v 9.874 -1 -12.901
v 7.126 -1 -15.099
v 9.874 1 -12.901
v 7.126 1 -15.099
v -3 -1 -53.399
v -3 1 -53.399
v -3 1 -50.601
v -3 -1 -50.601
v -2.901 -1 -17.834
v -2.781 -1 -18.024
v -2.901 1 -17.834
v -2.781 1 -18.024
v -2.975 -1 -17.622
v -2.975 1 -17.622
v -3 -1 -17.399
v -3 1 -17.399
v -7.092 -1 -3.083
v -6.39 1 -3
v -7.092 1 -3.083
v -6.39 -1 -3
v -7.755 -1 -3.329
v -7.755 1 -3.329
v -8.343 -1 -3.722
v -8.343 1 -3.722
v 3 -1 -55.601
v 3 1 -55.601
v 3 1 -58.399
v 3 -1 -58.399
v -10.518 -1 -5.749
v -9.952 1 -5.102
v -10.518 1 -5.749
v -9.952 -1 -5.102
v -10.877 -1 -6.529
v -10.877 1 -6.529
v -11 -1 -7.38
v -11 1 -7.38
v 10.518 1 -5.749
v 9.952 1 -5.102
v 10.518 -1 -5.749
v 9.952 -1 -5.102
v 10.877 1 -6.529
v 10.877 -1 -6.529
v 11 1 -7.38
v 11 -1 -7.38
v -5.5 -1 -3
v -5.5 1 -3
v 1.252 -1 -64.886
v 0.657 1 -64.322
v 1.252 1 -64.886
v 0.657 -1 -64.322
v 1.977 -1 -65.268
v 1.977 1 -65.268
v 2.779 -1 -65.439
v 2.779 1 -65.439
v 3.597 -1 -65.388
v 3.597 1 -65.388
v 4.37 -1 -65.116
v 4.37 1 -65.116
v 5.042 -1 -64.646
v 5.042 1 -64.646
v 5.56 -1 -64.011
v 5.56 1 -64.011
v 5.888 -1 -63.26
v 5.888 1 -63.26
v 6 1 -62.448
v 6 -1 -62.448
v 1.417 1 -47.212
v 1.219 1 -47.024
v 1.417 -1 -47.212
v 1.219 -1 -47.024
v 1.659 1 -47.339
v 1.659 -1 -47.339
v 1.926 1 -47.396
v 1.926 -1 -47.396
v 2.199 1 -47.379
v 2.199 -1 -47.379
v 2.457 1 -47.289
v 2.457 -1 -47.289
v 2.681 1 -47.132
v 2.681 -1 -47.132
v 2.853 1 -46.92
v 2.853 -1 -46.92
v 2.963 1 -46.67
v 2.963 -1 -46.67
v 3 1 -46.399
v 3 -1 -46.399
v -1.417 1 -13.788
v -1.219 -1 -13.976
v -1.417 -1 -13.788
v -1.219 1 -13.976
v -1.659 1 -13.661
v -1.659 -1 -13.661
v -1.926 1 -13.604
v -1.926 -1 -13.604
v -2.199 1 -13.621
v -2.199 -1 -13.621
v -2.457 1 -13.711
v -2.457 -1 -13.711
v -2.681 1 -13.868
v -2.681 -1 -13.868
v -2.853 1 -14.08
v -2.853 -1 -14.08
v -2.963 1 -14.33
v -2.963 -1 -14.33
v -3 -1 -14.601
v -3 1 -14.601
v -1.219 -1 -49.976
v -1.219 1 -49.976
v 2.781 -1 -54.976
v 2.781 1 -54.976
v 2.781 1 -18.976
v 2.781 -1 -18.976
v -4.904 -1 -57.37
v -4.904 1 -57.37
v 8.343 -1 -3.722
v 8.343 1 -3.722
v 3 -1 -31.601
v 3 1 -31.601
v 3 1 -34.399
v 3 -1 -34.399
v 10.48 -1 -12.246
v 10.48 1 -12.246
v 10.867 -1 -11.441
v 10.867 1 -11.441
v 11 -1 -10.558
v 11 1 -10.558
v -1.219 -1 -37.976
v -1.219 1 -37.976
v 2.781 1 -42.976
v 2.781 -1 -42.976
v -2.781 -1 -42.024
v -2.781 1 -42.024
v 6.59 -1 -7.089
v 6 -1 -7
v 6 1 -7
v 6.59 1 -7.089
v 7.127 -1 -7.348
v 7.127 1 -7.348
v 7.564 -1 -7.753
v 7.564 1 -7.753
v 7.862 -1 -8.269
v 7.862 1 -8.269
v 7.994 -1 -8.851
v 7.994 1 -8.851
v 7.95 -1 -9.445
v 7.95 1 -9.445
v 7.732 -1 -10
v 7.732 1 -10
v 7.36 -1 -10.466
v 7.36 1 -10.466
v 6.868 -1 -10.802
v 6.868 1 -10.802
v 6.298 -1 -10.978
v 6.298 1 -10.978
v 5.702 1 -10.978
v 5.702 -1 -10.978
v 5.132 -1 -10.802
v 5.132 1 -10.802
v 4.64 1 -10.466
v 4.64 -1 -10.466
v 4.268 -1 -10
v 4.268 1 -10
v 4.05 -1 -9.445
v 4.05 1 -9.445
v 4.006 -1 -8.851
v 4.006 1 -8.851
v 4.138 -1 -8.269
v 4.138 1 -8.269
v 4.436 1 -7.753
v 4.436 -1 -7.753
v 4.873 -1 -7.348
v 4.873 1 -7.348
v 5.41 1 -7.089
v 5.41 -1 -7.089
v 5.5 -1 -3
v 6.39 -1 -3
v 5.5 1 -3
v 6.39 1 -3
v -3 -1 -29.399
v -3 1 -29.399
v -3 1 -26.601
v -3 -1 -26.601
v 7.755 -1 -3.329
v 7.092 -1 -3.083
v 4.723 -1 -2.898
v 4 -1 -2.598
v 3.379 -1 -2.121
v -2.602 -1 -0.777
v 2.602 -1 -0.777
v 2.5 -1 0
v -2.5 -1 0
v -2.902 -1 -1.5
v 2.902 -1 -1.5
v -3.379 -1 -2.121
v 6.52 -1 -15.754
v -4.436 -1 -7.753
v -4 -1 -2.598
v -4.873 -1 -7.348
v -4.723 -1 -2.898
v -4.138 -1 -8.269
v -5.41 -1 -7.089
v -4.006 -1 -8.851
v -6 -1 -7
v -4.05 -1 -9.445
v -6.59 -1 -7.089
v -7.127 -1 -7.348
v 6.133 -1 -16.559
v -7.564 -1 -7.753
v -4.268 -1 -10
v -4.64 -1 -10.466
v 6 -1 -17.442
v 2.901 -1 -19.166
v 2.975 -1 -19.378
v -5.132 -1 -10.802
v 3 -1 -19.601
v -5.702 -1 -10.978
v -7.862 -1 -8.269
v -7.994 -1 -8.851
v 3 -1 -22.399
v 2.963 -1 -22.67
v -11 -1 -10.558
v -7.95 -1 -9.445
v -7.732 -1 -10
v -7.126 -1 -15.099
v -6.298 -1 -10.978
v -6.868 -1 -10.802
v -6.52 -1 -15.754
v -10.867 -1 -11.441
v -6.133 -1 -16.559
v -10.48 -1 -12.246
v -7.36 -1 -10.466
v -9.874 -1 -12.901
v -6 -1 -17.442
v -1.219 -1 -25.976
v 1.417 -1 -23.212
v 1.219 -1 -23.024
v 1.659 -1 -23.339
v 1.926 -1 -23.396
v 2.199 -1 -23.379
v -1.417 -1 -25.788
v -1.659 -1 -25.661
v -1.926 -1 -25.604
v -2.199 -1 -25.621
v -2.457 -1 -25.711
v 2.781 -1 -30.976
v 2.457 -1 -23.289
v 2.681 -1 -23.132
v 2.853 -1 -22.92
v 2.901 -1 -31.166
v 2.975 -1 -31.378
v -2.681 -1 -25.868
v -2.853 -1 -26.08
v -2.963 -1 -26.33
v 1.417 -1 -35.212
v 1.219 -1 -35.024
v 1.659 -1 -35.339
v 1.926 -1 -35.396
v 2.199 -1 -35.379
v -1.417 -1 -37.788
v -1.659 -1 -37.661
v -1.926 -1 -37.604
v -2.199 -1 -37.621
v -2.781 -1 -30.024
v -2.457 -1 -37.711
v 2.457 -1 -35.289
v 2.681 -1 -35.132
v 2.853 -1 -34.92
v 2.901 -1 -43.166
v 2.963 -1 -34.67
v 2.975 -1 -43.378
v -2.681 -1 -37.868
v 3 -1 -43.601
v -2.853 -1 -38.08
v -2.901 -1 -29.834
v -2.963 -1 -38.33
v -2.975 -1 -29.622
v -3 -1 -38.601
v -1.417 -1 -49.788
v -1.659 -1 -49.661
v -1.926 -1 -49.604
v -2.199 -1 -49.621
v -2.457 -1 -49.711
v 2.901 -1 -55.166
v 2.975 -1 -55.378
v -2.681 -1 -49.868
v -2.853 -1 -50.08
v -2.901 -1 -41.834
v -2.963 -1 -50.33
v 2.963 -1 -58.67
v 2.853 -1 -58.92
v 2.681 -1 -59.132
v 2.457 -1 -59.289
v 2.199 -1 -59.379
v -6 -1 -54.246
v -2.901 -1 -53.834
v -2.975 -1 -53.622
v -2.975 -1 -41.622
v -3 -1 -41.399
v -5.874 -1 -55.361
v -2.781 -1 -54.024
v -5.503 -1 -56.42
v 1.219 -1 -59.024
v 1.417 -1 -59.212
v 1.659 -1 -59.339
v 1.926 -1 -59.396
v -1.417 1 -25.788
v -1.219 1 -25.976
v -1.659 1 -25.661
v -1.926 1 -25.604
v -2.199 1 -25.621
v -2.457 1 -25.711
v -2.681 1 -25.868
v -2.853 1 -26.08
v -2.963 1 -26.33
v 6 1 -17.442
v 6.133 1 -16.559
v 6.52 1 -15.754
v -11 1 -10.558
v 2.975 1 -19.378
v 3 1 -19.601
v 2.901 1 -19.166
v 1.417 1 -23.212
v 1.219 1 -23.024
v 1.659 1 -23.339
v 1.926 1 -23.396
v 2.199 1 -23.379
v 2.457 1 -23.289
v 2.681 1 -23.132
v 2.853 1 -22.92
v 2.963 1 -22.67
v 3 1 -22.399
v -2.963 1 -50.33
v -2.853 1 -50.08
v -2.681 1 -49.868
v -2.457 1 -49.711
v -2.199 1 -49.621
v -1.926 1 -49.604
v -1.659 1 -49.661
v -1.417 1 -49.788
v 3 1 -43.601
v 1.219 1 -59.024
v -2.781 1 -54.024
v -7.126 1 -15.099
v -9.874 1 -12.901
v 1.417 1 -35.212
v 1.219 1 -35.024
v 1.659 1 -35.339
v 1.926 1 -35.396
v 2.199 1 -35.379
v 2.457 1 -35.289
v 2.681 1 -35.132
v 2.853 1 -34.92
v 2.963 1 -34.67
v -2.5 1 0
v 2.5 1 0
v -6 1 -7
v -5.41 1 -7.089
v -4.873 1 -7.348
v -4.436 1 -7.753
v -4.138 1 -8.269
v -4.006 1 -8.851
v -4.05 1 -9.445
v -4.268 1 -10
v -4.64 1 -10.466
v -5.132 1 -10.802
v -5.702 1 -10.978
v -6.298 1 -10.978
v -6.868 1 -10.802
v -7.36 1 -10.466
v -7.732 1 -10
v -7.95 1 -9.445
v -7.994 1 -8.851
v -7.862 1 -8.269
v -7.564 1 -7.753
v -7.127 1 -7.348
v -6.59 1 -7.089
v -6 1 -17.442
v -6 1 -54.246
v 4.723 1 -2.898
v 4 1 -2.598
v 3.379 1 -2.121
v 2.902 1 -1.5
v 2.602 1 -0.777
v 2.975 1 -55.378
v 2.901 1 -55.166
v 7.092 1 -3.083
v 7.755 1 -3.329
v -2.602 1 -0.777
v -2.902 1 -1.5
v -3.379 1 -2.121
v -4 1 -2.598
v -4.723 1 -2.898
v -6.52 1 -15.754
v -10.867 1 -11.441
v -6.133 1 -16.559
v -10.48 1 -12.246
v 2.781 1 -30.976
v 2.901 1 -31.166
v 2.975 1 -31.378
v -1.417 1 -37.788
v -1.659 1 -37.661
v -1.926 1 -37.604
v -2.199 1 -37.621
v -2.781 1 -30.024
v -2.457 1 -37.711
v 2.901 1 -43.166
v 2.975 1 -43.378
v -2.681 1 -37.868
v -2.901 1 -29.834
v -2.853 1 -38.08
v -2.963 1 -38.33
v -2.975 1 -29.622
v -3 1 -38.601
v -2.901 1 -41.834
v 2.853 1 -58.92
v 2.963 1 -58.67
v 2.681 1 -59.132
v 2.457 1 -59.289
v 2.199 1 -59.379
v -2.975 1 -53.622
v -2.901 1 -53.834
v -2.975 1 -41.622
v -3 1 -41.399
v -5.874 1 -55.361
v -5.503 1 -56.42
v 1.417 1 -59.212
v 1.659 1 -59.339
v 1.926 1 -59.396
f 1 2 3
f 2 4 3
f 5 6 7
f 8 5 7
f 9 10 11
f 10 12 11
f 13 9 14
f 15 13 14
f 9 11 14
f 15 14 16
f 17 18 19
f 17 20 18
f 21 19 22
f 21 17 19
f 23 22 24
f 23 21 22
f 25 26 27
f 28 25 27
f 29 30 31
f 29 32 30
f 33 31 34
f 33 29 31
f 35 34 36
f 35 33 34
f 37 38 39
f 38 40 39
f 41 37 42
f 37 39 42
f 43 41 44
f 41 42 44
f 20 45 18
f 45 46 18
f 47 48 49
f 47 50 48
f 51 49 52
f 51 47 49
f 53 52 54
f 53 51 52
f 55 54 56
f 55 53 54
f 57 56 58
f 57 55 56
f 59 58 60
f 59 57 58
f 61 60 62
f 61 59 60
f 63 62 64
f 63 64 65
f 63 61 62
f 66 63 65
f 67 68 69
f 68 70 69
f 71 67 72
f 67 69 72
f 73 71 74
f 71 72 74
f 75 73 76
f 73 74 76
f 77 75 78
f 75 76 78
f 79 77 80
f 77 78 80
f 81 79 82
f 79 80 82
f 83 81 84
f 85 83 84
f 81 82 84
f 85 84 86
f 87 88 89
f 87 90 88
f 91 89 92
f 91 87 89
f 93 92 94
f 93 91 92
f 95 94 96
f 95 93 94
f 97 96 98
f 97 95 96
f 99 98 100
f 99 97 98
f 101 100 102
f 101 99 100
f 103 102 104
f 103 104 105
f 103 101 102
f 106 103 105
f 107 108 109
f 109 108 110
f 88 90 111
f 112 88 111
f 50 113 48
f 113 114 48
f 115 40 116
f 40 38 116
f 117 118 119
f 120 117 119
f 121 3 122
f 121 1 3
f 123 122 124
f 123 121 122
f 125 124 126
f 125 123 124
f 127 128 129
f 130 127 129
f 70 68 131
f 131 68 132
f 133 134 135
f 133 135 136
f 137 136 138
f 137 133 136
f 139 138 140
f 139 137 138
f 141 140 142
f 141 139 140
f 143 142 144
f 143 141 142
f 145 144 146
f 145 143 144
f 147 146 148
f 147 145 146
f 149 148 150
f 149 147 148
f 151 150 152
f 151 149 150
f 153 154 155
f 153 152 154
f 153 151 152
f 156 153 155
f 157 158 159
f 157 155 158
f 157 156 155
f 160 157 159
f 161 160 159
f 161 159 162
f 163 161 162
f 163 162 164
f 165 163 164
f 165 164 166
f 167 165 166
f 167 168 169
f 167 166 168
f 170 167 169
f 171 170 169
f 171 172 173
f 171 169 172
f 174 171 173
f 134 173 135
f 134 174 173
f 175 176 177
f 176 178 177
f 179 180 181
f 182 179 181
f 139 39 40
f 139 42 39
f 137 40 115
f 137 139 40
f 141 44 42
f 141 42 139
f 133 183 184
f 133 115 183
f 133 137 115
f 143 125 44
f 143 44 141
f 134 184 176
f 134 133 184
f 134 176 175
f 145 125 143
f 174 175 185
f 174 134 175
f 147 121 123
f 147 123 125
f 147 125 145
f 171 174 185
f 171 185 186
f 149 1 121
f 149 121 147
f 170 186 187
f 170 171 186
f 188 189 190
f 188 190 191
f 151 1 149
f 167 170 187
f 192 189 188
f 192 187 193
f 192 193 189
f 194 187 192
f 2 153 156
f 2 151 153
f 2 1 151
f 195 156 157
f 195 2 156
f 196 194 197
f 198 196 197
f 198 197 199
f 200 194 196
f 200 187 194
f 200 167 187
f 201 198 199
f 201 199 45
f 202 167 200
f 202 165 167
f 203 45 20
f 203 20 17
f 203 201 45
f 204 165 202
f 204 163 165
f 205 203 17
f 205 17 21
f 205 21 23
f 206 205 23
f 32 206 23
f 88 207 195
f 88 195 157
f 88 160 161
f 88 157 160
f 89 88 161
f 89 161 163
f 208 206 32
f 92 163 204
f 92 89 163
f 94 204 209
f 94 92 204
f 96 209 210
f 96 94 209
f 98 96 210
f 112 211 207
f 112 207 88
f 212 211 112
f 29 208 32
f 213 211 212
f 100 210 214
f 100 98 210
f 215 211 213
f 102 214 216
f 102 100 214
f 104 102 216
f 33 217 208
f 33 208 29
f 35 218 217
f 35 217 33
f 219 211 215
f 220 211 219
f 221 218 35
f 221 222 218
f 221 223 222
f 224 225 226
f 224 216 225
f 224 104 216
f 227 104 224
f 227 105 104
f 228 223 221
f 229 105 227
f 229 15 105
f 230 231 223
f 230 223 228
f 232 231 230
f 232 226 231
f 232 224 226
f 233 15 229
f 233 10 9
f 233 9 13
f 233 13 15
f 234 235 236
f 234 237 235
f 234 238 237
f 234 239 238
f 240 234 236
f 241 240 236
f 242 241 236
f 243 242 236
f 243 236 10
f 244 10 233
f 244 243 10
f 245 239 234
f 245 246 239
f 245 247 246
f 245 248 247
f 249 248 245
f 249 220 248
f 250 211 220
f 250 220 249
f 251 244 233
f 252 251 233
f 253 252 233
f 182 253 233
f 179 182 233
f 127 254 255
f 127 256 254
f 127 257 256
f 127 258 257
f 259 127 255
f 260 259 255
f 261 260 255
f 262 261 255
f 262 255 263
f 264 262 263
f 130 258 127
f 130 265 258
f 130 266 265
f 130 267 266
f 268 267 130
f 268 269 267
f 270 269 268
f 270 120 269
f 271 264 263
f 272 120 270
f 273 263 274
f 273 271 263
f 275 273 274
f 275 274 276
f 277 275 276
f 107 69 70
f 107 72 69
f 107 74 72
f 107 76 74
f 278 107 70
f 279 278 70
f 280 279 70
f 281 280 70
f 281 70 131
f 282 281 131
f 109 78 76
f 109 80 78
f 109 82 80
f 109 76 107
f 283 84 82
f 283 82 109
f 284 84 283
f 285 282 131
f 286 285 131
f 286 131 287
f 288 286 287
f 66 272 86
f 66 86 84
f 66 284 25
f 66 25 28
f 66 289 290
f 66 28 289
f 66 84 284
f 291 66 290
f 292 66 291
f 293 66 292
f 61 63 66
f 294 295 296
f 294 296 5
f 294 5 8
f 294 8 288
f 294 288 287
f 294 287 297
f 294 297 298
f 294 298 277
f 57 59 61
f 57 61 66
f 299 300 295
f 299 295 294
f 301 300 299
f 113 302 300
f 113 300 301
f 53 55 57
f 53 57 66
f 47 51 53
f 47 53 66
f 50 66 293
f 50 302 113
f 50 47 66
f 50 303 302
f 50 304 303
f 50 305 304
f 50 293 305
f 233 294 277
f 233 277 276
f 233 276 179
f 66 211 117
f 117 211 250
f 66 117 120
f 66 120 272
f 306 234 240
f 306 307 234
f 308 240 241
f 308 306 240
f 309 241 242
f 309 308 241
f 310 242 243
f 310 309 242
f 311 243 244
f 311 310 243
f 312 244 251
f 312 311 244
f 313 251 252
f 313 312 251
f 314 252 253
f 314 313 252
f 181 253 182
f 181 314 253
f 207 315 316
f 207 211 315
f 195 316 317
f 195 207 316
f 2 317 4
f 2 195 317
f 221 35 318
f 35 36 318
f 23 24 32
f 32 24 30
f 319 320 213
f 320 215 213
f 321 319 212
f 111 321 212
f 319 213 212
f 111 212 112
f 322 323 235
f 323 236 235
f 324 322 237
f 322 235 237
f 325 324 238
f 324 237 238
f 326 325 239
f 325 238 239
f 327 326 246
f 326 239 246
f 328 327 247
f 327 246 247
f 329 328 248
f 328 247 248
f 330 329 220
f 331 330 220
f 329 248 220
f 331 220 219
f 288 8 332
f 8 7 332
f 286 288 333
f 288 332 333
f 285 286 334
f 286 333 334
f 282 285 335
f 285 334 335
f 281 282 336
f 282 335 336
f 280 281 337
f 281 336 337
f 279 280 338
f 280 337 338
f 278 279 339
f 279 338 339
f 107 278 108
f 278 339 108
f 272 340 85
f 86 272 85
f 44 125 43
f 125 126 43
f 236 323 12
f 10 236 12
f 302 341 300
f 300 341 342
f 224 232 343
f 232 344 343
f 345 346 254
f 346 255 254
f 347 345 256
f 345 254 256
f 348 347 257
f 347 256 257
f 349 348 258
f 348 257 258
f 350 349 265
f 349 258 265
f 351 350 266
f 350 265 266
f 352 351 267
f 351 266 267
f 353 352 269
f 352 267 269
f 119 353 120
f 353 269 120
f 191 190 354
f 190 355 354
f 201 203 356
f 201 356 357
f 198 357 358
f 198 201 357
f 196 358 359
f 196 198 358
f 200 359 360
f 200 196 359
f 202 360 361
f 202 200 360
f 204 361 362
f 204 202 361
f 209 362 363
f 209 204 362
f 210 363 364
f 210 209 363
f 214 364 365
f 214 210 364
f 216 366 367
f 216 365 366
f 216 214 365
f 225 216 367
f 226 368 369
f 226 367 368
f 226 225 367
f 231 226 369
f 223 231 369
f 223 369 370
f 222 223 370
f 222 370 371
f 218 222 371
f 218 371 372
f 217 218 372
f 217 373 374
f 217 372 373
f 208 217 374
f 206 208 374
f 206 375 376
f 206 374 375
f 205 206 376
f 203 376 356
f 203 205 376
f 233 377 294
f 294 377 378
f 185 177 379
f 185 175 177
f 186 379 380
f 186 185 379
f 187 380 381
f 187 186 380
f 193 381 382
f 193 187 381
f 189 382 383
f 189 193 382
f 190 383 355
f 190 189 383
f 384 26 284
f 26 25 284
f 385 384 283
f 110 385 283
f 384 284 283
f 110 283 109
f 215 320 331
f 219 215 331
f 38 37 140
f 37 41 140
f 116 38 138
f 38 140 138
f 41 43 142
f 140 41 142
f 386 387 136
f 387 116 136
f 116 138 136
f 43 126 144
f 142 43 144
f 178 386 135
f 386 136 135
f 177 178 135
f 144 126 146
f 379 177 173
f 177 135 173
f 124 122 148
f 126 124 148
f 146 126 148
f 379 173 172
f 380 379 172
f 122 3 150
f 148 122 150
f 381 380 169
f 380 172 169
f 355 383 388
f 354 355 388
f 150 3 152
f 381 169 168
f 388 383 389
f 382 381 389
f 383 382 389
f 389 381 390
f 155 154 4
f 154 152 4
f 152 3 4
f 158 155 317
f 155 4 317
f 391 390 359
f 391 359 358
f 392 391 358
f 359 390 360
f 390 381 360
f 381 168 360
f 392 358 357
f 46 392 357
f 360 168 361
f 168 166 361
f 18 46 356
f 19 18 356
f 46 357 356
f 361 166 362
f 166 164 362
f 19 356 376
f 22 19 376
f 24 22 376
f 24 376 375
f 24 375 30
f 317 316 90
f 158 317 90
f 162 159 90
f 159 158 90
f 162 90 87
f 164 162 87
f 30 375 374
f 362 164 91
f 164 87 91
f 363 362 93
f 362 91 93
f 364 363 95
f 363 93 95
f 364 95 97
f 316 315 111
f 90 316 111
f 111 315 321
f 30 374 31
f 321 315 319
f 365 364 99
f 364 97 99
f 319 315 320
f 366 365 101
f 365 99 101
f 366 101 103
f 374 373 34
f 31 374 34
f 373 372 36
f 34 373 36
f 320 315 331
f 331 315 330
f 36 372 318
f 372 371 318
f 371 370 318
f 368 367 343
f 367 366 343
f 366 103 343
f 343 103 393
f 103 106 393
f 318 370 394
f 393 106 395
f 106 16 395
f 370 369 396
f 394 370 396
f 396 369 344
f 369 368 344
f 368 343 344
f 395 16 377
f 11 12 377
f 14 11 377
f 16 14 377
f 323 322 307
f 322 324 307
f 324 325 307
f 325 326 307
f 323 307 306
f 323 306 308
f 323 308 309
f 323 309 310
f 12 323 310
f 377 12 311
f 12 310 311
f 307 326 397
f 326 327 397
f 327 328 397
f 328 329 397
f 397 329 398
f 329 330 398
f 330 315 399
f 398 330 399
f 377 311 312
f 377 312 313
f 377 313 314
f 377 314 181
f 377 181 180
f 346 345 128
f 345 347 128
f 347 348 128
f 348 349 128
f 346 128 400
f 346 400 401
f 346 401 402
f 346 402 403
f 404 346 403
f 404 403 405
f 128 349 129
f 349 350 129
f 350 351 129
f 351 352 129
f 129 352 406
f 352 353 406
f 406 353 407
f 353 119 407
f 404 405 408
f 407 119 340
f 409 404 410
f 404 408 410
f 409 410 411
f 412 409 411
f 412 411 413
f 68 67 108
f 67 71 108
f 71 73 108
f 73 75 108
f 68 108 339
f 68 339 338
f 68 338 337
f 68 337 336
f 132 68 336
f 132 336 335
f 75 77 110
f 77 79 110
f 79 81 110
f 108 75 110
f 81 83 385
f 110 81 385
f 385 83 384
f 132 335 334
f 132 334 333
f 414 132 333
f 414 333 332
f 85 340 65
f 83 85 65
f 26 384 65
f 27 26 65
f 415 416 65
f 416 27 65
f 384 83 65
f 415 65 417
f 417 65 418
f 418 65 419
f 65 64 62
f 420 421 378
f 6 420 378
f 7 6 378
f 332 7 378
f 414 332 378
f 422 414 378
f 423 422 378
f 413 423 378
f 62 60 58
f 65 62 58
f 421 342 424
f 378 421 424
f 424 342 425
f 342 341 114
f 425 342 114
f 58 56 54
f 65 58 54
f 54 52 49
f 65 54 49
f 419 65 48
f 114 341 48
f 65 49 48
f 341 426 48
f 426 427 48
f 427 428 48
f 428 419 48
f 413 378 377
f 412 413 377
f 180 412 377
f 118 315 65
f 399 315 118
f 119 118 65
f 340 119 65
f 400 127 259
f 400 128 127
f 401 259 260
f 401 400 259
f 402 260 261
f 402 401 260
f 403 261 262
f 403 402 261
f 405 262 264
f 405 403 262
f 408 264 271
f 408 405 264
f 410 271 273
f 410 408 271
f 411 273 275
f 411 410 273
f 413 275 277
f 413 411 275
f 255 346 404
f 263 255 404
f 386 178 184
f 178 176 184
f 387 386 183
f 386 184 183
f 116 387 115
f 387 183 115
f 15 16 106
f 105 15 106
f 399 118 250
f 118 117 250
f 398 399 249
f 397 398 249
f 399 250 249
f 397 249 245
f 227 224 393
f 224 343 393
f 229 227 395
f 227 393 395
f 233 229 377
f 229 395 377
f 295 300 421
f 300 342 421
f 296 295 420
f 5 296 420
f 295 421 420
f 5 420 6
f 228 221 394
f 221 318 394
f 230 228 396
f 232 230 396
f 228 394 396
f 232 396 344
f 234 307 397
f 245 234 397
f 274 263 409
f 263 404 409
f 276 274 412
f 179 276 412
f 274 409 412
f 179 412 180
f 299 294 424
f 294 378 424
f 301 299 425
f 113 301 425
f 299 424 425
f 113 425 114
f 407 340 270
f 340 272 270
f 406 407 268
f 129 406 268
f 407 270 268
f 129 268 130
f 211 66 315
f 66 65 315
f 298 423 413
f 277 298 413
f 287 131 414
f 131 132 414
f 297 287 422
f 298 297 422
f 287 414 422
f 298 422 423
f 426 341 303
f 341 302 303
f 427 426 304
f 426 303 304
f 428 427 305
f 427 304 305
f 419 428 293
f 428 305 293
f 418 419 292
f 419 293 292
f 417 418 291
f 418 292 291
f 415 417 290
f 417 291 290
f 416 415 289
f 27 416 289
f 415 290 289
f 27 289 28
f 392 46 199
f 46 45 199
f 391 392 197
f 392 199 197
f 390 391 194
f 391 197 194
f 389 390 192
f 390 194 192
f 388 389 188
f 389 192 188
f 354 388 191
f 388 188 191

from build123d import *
from OCP.BRepFilletAPI import BRepFilletAPI_MakeFillet

# Parameters (mm, degrees)
BOSS_EXTRUDE1_DEPTH     = 1
CUT_EXTRUDE1_DEPTH      = 72.854018677
CUT_EXTRUDE2_DEPTH      = 72.854018677
CUT_EXTRUDE2_DEPTH_BACK = 72.854018677
SKETCH2_R               = 2
FILLET1_R               = 3
FILLET2_R               = 3
FILLET3_R1              = 5
FILLET3_R2              = 3
FILLET4_R               = 1
LPATTERN1_COUNT         = 4
LPATTERN1_PITCH         = 12
FILLET4_OF_LPATTERN1_R  = 1


with BuildPart() as part:
    # Sketch1 → Boss-Extrude1 (new, symmetric)
    with BuildSketch(Plane(origin=(0, 0, 0), x_dir=(1, 0, 0), z_dir=(0, 1, 0))):
        Polygon((-6, 56), (6, 71), (6, 16), (11, 12), (11, 6), (7.5, 3), (2.5, 3), (2.5, 0), (-2.5, 0), (-2.5, 3), (-7.5, 3), (-11, 6), (-11, 12), (-6, 16), align=None)
    extrude(amount=BOSS_EXTRUDE1_DEPTH, both=True)

    # Sketch1<3> → Cut-Extrude1 (cut, symmetric)
    with BuildSketch(Plane(origin=(0, 0, 0), x_dir=(1, 0, 0), z_dir=(0, 1, 0))):
        Polygon((3, 61.25), (-3, 53.75), (-3, 47.75), (3, 55.25), align=None)
    cut_extrude1 = extrude(amount=CUT_EXTRUDE1_DEPTH, both=True, mode=Mode.SUBTRACT)

    # Sketch2 → Cut-Extrude2 (cut, two sides: drawn at the far end of the back side and taken through both)
    with BuildSketch(Plane(origin=(0, 0, 0), x_dir=(1, 0, 0), z_dir=(0, 1, 0)).offset(-CUT_EXTRUDE2_DEPTH_BACK)):
        with Locations(Location((-6, 9, 0), (0, 0, 270))):
            Circle(SKETCH2_R)
        with Locations(Location((6, 9, 0), (0, 0, 270))):
            Circle(SKETCH2_R)
    extrude(amount=CUT_EXTRUDE2_DEPTH + CUT_EXTRUDE2_DEPTH_BACK, mode=Mode.SUBTRACT)

    # Fillet1
    fillet1_edges = [part.edges().sort_by_distance(p)[0] for p in [
        (2.5, 0, -3),
        (-2.5, 0, -3),
    ]]
    fillet(fillet1_edges, radius=FILLET1_R - 0.0001)  # a hair under: the kernel refuses the full size

    # Fillet2
    fillet2_edges = [part.edges().sort_by_distance(p)[0] for p in [
        (-6, 0, -16),
        (-11, 0, -12),
        (-11, 0, -6),
        (-7.5, 0, -3),
        (7.5, 0, -3),
        (11, 0, -6),
        (11, 0, -12),
        (6, 0, -16),
    ]]
    fillet(fillet2_edges, radius=FILLET2_R)

    # Fillet3: one fillet with a radius per group of edges: ONE call of the kernel's fillet builder (fillet() takes one radius for all edges)
    fillet3_edges_1 = [part.edges().sort_by_distance(p)[0] for p in [
        (-6, 0, -56),
    ]]
    fillet3_edges_2 = [part.edges().sort_by_distance(p)[0] for p in [
        (6, 0, -71),
    ]]
    fillet3 = BRepFilletAPI_MakeFillet(part.part.solid().wrapped)
    for e in fillet3_edges_1:
        fillet3.Add(FILLET3_R1, e.wrapped)
    for e in fillet3_edges_2:
        fillet3.Add(FILLET3_R2, e.wrapped)
    add(Compound.cast(fillet3.Shape()), mode=Mode.REPLACE)

    # Fillet4
    fillet4_edges = [part.edges().sort_by_distance(p)[0] for p in [
        (-3, 0, -47.75),
        (-3, 0, -53.75),
        (3, 0, -61.25),
        (3, 0, -55.25),
    ]]
    fillet(fillet4_edges, radius=FILLET4_R)

    # LPattern1: Cut-Extrude1 ×4
    with Locations(*[(0, 0, i * LPATTERN1_PITCH) for i in range(1, LPATTERN1_COUNT)]):
        add(cut_extrude1, mode=Mode.SUBTRACT)

    # Fillet4 of LPattern1
    fillet4_of_lpattern1_edges = [part.edges().sort_by_distance(p)[0] for p in [
        (-3, 0, -35.75),
        (-3, 0, -41.75),
        (3, 0, -49.25),
        (3, 0, -43.25),
        (-3, 0, -23.75),
        (-3, 0, -29.75),
        (3, 0, -37.25),
        (3, 0, -31.25),
        (-3, 0, -11.75),
        (-3, 0, -17.75),
        (3, 0, -25.25),
        (3, 0, -19.25),
    ]]
    fillet(fillet4_of_lpattern1_edges, radius=FILLET4_OF_LPATTERN1_R)


solid = part.part
